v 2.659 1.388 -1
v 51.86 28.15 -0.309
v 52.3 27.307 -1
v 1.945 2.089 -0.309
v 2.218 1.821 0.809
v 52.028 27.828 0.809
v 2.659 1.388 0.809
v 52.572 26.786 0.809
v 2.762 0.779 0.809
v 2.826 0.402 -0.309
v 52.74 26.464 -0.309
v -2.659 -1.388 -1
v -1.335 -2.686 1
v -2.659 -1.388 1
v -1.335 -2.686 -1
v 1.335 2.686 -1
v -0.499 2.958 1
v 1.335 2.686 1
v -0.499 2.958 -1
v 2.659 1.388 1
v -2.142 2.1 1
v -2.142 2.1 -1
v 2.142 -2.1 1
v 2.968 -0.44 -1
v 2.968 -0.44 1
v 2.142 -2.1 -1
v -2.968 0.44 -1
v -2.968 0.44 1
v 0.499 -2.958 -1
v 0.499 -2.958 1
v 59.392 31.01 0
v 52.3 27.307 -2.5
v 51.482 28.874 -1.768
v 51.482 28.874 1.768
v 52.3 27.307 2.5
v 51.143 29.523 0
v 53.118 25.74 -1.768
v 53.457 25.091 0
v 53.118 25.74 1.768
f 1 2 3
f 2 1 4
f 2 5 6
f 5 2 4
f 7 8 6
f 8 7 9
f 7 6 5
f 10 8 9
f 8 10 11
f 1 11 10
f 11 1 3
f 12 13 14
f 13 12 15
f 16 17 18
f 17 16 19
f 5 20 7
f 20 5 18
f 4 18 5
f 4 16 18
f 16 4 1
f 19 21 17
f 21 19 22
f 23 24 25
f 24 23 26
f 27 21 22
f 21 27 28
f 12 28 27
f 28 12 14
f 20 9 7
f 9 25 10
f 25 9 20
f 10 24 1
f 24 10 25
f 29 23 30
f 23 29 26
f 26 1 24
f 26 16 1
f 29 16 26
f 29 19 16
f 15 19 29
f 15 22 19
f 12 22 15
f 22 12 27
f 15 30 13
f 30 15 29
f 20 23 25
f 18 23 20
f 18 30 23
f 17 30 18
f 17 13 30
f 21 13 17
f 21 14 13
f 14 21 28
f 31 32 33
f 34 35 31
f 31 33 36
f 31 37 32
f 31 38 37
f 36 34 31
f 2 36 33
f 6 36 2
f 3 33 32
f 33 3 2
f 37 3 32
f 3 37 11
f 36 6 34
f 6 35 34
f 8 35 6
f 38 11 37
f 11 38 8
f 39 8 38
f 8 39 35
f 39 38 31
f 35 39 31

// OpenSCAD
// Parameters
axis_length = 60; //[30:120:1]
axis_diameter = 2; //[1:4:0.1]
origin_marker_diameter = 6; //[3:12:0.5]
origin_marker_height = 2; //[1:6:0.5]
arrowhead_length = 8; //[4:16:0.5]
arrowhead_diameter = 5; //[2.5:10:0.5]
end_cap_length = 3; //[1.5:8:0.5]
overlap = 1; //[0.5:2:0.1]
A_x = 5.21; //[2.605:10.42:0.01]
A_y = 2.72; //[1.36:5.44:0.01]
A_z = 0; //[-1:1:0.01]
axis_angle_deg = 27.57; //[0:360:0.01]

// Base Shapes
module axis_rod_base() {
  translate([axis_length/2, 0, 0])
    rotate([0, 90, 0])
      cylinder(h=axis_length, r=axis_diameter/2, center=true);
}

module origin_marker_base() {
  translate([0, 0, 0])
    cylinder(h=origin_marker_height, r=origin_marker_diameter/2, center=true);
}

module arrowhead_tip_base() {
  translate([axis_length + arrowhead_length/2 - overlap, 0, 0])
    rotate([0, 90, 0])
      cylinder(h=arrowhead_length, r1=arrowhead_diameter/2, r2=0, center=true);
}

module end_cap_base() {
  translate([axis_length - end_cap_length/2 + overlap, 0, 0])
    rotate([0, 90, 0])
      cylinder(h=end_cap_length, r=axis_diameter/2, center=true);
}

// Operations
module axis_complete_unoriented() {
  union() {
    axis_rod_base();
    origin_marker_base();
    end_cap_base();
    arrowhead_tip_base();
  }
}

// Final Output
rotate([0, 0, axis_angle_deg])
  axis_complete_unoriented();
